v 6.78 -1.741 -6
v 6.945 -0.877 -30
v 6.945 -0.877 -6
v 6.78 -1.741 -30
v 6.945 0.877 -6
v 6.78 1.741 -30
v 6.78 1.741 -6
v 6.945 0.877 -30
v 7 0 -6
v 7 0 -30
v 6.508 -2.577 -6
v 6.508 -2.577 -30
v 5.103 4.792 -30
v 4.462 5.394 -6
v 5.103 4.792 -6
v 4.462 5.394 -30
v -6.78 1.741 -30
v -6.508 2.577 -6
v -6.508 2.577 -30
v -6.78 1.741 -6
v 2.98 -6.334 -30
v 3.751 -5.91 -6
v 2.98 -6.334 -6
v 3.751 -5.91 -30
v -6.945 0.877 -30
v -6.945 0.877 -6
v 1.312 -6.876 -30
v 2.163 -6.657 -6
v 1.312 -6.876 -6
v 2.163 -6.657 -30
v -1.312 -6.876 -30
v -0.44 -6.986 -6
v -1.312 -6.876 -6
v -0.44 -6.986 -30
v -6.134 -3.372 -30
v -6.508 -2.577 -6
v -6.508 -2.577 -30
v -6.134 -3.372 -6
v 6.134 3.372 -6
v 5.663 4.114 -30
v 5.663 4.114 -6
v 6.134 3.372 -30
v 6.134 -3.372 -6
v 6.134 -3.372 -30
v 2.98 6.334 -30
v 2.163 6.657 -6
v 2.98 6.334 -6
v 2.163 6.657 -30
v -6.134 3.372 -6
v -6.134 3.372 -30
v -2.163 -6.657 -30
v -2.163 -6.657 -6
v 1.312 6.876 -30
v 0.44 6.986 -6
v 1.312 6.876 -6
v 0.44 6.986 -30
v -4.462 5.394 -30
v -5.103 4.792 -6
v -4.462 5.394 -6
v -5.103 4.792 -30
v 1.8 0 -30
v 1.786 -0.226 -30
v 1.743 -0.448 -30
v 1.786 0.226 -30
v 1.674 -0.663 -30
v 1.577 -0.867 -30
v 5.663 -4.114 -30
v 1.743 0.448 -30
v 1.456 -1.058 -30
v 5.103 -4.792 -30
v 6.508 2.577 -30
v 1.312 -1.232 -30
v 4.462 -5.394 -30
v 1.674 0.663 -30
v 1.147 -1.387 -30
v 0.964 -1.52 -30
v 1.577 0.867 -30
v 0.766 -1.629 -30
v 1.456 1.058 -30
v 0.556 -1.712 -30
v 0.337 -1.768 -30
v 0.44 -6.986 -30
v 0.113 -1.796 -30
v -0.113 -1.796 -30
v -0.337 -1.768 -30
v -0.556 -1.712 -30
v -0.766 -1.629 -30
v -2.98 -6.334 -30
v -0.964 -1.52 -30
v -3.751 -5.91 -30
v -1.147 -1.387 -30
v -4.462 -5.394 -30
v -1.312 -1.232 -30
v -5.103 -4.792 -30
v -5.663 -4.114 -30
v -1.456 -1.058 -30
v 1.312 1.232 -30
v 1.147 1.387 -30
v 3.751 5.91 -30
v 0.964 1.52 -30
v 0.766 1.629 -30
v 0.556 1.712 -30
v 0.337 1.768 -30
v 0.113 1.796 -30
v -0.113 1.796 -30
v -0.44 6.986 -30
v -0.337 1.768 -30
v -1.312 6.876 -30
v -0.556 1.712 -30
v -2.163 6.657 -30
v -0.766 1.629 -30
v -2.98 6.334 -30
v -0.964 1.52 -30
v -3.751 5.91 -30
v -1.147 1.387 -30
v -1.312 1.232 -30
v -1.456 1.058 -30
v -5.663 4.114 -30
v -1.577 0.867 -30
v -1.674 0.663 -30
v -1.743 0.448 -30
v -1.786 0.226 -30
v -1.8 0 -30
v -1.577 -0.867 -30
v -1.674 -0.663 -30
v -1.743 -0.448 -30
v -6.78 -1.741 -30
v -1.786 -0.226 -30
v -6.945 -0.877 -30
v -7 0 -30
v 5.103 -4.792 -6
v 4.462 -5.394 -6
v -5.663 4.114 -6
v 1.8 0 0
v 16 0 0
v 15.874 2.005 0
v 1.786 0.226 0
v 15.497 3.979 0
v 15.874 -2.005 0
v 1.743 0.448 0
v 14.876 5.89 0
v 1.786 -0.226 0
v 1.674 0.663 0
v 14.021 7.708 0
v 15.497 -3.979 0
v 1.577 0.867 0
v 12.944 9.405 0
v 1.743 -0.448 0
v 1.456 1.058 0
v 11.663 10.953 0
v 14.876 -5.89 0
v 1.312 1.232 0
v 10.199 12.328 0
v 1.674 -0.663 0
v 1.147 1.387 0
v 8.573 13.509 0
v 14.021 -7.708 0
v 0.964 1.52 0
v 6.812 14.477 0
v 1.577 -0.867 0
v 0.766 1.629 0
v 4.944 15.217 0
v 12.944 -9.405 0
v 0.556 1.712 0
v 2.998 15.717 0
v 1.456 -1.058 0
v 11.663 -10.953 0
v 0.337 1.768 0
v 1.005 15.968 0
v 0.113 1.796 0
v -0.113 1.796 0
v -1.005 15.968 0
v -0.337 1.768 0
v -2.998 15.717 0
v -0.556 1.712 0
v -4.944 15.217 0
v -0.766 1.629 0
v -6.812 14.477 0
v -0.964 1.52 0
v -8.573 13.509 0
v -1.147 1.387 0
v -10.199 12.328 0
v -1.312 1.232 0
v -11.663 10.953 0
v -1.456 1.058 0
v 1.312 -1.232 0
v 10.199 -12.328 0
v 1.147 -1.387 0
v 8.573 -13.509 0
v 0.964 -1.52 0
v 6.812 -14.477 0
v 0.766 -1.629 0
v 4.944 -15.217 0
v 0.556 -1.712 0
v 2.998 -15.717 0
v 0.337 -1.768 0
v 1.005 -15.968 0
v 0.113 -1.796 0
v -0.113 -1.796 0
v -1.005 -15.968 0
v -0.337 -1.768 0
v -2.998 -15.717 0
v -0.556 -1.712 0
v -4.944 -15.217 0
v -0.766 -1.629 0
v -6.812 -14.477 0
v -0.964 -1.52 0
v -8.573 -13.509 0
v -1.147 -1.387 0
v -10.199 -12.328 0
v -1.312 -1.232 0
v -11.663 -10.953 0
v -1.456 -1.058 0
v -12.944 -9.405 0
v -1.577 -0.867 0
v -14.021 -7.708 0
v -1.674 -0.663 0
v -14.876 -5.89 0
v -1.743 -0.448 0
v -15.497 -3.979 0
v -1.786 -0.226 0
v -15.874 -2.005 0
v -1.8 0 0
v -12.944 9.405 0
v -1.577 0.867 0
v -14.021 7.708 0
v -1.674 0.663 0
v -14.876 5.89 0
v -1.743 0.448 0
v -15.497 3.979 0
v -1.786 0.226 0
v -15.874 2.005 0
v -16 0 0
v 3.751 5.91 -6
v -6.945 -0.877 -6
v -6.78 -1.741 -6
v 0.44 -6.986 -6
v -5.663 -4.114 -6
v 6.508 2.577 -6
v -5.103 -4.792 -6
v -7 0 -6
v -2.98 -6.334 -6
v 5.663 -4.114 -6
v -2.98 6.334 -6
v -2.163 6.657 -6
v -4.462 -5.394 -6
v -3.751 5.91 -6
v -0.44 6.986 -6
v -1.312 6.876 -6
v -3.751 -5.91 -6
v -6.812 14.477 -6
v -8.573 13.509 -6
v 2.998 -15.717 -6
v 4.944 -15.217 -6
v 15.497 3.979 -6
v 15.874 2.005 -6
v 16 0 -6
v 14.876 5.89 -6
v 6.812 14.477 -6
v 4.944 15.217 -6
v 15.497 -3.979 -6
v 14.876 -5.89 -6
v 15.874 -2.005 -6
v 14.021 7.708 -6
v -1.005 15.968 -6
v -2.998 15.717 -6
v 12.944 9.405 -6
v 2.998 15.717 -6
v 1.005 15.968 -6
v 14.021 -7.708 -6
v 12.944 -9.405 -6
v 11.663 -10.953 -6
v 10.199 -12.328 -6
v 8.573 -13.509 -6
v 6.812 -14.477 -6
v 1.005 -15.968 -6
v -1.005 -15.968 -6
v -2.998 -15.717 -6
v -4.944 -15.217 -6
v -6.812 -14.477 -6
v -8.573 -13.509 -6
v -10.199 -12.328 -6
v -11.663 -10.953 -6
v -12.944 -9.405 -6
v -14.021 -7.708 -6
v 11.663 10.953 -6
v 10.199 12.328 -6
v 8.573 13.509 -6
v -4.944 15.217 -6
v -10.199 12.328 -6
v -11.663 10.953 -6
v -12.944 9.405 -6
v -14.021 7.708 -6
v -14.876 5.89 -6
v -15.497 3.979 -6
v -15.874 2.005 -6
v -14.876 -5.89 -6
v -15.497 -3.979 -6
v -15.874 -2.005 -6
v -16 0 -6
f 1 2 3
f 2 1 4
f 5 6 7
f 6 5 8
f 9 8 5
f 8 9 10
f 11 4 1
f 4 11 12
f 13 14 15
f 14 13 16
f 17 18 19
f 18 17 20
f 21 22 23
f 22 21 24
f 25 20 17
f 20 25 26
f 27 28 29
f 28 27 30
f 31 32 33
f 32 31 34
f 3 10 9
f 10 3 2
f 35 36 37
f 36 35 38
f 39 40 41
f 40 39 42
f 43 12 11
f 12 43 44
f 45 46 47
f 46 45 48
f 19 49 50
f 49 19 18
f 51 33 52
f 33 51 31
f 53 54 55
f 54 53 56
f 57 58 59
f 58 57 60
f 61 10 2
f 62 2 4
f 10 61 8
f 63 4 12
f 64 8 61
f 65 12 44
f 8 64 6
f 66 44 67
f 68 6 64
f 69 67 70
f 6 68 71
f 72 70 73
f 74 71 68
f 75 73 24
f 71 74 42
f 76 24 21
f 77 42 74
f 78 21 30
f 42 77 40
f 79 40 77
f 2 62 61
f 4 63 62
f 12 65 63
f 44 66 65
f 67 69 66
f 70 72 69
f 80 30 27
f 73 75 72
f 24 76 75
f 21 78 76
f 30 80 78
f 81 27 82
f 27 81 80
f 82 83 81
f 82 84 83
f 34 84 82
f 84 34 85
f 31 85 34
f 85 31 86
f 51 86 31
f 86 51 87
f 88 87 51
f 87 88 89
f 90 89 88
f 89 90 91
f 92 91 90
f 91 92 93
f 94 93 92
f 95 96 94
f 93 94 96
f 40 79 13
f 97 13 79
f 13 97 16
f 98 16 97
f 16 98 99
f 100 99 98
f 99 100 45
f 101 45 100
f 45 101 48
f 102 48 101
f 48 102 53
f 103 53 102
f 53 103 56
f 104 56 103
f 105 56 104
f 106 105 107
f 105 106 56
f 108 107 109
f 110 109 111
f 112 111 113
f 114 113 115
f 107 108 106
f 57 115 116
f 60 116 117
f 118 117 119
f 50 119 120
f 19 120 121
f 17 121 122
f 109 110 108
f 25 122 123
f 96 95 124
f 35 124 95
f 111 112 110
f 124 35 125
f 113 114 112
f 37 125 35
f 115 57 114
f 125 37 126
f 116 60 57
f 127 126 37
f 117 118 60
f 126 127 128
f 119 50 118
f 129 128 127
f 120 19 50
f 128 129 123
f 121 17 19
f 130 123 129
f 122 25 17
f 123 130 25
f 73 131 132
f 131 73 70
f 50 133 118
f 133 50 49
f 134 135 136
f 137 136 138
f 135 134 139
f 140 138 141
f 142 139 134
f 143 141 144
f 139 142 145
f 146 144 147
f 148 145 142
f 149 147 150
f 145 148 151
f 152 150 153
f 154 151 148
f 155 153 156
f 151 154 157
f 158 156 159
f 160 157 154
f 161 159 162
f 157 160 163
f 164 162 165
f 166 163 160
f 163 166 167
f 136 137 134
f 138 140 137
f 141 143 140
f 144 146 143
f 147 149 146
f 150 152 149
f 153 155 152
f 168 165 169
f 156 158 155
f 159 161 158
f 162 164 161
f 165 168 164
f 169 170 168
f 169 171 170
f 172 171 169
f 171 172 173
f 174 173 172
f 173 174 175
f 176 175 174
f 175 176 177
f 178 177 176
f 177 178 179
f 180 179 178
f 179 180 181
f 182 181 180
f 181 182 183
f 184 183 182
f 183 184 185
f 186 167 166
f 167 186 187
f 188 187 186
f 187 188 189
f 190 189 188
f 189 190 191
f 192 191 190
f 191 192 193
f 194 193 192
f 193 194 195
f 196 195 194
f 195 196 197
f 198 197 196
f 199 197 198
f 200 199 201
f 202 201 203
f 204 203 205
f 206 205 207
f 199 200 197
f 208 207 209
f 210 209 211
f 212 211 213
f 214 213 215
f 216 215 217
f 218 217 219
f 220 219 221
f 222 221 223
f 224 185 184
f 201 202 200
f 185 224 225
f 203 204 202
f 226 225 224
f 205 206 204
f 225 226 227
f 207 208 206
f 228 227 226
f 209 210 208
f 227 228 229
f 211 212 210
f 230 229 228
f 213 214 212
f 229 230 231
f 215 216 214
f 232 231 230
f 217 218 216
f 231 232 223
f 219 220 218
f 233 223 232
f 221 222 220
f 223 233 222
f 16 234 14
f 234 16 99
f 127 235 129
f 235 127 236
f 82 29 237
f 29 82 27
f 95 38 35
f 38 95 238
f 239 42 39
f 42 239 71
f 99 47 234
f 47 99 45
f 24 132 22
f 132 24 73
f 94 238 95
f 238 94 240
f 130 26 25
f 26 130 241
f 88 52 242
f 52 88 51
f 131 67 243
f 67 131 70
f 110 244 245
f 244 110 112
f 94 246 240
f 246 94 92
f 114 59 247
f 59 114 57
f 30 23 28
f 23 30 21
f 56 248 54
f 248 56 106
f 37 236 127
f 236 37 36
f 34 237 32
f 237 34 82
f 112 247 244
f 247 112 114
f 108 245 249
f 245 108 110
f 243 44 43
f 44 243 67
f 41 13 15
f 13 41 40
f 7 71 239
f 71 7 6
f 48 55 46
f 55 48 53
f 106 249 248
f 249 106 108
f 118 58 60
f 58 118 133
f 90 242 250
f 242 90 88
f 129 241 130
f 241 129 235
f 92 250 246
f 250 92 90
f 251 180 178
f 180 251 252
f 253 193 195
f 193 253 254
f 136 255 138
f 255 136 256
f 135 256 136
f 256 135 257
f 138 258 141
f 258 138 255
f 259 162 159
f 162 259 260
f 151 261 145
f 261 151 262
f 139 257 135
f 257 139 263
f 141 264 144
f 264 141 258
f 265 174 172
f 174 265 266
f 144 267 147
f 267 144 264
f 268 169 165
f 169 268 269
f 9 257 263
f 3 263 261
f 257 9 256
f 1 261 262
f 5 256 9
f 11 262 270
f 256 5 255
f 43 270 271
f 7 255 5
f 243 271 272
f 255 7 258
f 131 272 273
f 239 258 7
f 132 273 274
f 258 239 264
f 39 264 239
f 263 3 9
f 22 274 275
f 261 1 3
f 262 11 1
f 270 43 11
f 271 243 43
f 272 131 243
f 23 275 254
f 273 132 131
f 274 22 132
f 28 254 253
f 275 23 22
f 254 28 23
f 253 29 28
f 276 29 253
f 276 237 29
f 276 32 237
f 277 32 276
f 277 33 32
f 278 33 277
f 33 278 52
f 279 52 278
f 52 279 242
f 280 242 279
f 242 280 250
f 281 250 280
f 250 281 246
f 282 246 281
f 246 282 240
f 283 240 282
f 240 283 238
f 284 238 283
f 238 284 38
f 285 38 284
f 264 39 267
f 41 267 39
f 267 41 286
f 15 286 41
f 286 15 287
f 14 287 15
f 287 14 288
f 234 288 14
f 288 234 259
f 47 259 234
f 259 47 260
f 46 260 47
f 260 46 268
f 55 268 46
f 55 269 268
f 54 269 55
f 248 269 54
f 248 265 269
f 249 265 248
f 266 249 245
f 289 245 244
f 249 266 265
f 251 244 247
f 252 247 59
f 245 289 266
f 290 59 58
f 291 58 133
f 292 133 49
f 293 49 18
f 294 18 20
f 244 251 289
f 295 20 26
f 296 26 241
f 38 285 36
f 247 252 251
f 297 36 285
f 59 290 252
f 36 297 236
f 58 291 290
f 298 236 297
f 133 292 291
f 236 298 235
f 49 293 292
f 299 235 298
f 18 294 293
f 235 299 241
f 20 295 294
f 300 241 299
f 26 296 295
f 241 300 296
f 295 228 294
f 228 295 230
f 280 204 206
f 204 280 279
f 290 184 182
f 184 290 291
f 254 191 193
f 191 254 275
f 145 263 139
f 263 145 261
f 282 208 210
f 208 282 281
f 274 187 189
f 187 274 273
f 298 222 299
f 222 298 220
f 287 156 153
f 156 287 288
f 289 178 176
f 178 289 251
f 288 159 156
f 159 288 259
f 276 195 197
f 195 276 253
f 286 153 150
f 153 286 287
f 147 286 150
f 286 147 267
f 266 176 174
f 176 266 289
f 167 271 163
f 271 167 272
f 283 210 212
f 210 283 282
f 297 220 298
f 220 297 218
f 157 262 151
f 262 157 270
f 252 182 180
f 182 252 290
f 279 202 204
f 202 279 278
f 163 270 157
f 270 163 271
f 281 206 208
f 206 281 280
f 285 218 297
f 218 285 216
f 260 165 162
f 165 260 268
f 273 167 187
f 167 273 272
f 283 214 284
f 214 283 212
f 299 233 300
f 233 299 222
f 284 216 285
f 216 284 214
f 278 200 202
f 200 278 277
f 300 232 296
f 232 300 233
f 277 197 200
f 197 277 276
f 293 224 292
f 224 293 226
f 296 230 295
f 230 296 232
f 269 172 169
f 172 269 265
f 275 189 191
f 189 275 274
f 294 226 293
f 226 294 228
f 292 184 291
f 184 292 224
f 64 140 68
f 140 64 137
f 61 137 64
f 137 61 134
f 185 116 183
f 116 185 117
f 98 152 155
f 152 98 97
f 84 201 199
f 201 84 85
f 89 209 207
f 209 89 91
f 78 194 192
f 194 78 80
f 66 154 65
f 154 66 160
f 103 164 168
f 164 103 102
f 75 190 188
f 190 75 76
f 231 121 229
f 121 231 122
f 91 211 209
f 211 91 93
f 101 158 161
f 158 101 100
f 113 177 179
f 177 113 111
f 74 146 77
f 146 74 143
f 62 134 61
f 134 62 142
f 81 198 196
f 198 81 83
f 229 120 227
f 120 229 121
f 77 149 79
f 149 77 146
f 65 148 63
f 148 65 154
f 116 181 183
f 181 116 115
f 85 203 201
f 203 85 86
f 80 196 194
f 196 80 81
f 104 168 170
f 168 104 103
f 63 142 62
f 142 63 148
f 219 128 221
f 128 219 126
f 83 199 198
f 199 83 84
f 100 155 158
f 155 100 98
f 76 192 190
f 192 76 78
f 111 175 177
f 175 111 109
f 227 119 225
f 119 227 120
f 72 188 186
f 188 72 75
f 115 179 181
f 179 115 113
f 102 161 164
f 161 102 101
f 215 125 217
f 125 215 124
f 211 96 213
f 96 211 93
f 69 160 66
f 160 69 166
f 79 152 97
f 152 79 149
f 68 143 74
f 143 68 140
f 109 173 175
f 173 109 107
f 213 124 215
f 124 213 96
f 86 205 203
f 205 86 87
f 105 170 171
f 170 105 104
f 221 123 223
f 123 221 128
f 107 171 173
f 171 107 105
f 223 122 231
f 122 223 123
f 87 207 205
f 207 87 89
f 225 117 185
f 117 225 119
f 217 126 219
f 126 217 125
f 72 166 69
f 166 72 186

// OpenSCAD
$fn = 50;


difference() {
	union() {
		translate(v = [0, 0, -30.0000000000]) {
			cylinder(h = 30, r = 7.0000000000);
		}
		translate(v = [0, 0, -6.0000000000]) {
			cylinder(h = 6, r = 16.0000000000);
		}
	}
	union() {
		#translate(v = [0, 0, -30]) {
			cylinder(h = 30, r = 1.8000000000);
		}
	}
}
